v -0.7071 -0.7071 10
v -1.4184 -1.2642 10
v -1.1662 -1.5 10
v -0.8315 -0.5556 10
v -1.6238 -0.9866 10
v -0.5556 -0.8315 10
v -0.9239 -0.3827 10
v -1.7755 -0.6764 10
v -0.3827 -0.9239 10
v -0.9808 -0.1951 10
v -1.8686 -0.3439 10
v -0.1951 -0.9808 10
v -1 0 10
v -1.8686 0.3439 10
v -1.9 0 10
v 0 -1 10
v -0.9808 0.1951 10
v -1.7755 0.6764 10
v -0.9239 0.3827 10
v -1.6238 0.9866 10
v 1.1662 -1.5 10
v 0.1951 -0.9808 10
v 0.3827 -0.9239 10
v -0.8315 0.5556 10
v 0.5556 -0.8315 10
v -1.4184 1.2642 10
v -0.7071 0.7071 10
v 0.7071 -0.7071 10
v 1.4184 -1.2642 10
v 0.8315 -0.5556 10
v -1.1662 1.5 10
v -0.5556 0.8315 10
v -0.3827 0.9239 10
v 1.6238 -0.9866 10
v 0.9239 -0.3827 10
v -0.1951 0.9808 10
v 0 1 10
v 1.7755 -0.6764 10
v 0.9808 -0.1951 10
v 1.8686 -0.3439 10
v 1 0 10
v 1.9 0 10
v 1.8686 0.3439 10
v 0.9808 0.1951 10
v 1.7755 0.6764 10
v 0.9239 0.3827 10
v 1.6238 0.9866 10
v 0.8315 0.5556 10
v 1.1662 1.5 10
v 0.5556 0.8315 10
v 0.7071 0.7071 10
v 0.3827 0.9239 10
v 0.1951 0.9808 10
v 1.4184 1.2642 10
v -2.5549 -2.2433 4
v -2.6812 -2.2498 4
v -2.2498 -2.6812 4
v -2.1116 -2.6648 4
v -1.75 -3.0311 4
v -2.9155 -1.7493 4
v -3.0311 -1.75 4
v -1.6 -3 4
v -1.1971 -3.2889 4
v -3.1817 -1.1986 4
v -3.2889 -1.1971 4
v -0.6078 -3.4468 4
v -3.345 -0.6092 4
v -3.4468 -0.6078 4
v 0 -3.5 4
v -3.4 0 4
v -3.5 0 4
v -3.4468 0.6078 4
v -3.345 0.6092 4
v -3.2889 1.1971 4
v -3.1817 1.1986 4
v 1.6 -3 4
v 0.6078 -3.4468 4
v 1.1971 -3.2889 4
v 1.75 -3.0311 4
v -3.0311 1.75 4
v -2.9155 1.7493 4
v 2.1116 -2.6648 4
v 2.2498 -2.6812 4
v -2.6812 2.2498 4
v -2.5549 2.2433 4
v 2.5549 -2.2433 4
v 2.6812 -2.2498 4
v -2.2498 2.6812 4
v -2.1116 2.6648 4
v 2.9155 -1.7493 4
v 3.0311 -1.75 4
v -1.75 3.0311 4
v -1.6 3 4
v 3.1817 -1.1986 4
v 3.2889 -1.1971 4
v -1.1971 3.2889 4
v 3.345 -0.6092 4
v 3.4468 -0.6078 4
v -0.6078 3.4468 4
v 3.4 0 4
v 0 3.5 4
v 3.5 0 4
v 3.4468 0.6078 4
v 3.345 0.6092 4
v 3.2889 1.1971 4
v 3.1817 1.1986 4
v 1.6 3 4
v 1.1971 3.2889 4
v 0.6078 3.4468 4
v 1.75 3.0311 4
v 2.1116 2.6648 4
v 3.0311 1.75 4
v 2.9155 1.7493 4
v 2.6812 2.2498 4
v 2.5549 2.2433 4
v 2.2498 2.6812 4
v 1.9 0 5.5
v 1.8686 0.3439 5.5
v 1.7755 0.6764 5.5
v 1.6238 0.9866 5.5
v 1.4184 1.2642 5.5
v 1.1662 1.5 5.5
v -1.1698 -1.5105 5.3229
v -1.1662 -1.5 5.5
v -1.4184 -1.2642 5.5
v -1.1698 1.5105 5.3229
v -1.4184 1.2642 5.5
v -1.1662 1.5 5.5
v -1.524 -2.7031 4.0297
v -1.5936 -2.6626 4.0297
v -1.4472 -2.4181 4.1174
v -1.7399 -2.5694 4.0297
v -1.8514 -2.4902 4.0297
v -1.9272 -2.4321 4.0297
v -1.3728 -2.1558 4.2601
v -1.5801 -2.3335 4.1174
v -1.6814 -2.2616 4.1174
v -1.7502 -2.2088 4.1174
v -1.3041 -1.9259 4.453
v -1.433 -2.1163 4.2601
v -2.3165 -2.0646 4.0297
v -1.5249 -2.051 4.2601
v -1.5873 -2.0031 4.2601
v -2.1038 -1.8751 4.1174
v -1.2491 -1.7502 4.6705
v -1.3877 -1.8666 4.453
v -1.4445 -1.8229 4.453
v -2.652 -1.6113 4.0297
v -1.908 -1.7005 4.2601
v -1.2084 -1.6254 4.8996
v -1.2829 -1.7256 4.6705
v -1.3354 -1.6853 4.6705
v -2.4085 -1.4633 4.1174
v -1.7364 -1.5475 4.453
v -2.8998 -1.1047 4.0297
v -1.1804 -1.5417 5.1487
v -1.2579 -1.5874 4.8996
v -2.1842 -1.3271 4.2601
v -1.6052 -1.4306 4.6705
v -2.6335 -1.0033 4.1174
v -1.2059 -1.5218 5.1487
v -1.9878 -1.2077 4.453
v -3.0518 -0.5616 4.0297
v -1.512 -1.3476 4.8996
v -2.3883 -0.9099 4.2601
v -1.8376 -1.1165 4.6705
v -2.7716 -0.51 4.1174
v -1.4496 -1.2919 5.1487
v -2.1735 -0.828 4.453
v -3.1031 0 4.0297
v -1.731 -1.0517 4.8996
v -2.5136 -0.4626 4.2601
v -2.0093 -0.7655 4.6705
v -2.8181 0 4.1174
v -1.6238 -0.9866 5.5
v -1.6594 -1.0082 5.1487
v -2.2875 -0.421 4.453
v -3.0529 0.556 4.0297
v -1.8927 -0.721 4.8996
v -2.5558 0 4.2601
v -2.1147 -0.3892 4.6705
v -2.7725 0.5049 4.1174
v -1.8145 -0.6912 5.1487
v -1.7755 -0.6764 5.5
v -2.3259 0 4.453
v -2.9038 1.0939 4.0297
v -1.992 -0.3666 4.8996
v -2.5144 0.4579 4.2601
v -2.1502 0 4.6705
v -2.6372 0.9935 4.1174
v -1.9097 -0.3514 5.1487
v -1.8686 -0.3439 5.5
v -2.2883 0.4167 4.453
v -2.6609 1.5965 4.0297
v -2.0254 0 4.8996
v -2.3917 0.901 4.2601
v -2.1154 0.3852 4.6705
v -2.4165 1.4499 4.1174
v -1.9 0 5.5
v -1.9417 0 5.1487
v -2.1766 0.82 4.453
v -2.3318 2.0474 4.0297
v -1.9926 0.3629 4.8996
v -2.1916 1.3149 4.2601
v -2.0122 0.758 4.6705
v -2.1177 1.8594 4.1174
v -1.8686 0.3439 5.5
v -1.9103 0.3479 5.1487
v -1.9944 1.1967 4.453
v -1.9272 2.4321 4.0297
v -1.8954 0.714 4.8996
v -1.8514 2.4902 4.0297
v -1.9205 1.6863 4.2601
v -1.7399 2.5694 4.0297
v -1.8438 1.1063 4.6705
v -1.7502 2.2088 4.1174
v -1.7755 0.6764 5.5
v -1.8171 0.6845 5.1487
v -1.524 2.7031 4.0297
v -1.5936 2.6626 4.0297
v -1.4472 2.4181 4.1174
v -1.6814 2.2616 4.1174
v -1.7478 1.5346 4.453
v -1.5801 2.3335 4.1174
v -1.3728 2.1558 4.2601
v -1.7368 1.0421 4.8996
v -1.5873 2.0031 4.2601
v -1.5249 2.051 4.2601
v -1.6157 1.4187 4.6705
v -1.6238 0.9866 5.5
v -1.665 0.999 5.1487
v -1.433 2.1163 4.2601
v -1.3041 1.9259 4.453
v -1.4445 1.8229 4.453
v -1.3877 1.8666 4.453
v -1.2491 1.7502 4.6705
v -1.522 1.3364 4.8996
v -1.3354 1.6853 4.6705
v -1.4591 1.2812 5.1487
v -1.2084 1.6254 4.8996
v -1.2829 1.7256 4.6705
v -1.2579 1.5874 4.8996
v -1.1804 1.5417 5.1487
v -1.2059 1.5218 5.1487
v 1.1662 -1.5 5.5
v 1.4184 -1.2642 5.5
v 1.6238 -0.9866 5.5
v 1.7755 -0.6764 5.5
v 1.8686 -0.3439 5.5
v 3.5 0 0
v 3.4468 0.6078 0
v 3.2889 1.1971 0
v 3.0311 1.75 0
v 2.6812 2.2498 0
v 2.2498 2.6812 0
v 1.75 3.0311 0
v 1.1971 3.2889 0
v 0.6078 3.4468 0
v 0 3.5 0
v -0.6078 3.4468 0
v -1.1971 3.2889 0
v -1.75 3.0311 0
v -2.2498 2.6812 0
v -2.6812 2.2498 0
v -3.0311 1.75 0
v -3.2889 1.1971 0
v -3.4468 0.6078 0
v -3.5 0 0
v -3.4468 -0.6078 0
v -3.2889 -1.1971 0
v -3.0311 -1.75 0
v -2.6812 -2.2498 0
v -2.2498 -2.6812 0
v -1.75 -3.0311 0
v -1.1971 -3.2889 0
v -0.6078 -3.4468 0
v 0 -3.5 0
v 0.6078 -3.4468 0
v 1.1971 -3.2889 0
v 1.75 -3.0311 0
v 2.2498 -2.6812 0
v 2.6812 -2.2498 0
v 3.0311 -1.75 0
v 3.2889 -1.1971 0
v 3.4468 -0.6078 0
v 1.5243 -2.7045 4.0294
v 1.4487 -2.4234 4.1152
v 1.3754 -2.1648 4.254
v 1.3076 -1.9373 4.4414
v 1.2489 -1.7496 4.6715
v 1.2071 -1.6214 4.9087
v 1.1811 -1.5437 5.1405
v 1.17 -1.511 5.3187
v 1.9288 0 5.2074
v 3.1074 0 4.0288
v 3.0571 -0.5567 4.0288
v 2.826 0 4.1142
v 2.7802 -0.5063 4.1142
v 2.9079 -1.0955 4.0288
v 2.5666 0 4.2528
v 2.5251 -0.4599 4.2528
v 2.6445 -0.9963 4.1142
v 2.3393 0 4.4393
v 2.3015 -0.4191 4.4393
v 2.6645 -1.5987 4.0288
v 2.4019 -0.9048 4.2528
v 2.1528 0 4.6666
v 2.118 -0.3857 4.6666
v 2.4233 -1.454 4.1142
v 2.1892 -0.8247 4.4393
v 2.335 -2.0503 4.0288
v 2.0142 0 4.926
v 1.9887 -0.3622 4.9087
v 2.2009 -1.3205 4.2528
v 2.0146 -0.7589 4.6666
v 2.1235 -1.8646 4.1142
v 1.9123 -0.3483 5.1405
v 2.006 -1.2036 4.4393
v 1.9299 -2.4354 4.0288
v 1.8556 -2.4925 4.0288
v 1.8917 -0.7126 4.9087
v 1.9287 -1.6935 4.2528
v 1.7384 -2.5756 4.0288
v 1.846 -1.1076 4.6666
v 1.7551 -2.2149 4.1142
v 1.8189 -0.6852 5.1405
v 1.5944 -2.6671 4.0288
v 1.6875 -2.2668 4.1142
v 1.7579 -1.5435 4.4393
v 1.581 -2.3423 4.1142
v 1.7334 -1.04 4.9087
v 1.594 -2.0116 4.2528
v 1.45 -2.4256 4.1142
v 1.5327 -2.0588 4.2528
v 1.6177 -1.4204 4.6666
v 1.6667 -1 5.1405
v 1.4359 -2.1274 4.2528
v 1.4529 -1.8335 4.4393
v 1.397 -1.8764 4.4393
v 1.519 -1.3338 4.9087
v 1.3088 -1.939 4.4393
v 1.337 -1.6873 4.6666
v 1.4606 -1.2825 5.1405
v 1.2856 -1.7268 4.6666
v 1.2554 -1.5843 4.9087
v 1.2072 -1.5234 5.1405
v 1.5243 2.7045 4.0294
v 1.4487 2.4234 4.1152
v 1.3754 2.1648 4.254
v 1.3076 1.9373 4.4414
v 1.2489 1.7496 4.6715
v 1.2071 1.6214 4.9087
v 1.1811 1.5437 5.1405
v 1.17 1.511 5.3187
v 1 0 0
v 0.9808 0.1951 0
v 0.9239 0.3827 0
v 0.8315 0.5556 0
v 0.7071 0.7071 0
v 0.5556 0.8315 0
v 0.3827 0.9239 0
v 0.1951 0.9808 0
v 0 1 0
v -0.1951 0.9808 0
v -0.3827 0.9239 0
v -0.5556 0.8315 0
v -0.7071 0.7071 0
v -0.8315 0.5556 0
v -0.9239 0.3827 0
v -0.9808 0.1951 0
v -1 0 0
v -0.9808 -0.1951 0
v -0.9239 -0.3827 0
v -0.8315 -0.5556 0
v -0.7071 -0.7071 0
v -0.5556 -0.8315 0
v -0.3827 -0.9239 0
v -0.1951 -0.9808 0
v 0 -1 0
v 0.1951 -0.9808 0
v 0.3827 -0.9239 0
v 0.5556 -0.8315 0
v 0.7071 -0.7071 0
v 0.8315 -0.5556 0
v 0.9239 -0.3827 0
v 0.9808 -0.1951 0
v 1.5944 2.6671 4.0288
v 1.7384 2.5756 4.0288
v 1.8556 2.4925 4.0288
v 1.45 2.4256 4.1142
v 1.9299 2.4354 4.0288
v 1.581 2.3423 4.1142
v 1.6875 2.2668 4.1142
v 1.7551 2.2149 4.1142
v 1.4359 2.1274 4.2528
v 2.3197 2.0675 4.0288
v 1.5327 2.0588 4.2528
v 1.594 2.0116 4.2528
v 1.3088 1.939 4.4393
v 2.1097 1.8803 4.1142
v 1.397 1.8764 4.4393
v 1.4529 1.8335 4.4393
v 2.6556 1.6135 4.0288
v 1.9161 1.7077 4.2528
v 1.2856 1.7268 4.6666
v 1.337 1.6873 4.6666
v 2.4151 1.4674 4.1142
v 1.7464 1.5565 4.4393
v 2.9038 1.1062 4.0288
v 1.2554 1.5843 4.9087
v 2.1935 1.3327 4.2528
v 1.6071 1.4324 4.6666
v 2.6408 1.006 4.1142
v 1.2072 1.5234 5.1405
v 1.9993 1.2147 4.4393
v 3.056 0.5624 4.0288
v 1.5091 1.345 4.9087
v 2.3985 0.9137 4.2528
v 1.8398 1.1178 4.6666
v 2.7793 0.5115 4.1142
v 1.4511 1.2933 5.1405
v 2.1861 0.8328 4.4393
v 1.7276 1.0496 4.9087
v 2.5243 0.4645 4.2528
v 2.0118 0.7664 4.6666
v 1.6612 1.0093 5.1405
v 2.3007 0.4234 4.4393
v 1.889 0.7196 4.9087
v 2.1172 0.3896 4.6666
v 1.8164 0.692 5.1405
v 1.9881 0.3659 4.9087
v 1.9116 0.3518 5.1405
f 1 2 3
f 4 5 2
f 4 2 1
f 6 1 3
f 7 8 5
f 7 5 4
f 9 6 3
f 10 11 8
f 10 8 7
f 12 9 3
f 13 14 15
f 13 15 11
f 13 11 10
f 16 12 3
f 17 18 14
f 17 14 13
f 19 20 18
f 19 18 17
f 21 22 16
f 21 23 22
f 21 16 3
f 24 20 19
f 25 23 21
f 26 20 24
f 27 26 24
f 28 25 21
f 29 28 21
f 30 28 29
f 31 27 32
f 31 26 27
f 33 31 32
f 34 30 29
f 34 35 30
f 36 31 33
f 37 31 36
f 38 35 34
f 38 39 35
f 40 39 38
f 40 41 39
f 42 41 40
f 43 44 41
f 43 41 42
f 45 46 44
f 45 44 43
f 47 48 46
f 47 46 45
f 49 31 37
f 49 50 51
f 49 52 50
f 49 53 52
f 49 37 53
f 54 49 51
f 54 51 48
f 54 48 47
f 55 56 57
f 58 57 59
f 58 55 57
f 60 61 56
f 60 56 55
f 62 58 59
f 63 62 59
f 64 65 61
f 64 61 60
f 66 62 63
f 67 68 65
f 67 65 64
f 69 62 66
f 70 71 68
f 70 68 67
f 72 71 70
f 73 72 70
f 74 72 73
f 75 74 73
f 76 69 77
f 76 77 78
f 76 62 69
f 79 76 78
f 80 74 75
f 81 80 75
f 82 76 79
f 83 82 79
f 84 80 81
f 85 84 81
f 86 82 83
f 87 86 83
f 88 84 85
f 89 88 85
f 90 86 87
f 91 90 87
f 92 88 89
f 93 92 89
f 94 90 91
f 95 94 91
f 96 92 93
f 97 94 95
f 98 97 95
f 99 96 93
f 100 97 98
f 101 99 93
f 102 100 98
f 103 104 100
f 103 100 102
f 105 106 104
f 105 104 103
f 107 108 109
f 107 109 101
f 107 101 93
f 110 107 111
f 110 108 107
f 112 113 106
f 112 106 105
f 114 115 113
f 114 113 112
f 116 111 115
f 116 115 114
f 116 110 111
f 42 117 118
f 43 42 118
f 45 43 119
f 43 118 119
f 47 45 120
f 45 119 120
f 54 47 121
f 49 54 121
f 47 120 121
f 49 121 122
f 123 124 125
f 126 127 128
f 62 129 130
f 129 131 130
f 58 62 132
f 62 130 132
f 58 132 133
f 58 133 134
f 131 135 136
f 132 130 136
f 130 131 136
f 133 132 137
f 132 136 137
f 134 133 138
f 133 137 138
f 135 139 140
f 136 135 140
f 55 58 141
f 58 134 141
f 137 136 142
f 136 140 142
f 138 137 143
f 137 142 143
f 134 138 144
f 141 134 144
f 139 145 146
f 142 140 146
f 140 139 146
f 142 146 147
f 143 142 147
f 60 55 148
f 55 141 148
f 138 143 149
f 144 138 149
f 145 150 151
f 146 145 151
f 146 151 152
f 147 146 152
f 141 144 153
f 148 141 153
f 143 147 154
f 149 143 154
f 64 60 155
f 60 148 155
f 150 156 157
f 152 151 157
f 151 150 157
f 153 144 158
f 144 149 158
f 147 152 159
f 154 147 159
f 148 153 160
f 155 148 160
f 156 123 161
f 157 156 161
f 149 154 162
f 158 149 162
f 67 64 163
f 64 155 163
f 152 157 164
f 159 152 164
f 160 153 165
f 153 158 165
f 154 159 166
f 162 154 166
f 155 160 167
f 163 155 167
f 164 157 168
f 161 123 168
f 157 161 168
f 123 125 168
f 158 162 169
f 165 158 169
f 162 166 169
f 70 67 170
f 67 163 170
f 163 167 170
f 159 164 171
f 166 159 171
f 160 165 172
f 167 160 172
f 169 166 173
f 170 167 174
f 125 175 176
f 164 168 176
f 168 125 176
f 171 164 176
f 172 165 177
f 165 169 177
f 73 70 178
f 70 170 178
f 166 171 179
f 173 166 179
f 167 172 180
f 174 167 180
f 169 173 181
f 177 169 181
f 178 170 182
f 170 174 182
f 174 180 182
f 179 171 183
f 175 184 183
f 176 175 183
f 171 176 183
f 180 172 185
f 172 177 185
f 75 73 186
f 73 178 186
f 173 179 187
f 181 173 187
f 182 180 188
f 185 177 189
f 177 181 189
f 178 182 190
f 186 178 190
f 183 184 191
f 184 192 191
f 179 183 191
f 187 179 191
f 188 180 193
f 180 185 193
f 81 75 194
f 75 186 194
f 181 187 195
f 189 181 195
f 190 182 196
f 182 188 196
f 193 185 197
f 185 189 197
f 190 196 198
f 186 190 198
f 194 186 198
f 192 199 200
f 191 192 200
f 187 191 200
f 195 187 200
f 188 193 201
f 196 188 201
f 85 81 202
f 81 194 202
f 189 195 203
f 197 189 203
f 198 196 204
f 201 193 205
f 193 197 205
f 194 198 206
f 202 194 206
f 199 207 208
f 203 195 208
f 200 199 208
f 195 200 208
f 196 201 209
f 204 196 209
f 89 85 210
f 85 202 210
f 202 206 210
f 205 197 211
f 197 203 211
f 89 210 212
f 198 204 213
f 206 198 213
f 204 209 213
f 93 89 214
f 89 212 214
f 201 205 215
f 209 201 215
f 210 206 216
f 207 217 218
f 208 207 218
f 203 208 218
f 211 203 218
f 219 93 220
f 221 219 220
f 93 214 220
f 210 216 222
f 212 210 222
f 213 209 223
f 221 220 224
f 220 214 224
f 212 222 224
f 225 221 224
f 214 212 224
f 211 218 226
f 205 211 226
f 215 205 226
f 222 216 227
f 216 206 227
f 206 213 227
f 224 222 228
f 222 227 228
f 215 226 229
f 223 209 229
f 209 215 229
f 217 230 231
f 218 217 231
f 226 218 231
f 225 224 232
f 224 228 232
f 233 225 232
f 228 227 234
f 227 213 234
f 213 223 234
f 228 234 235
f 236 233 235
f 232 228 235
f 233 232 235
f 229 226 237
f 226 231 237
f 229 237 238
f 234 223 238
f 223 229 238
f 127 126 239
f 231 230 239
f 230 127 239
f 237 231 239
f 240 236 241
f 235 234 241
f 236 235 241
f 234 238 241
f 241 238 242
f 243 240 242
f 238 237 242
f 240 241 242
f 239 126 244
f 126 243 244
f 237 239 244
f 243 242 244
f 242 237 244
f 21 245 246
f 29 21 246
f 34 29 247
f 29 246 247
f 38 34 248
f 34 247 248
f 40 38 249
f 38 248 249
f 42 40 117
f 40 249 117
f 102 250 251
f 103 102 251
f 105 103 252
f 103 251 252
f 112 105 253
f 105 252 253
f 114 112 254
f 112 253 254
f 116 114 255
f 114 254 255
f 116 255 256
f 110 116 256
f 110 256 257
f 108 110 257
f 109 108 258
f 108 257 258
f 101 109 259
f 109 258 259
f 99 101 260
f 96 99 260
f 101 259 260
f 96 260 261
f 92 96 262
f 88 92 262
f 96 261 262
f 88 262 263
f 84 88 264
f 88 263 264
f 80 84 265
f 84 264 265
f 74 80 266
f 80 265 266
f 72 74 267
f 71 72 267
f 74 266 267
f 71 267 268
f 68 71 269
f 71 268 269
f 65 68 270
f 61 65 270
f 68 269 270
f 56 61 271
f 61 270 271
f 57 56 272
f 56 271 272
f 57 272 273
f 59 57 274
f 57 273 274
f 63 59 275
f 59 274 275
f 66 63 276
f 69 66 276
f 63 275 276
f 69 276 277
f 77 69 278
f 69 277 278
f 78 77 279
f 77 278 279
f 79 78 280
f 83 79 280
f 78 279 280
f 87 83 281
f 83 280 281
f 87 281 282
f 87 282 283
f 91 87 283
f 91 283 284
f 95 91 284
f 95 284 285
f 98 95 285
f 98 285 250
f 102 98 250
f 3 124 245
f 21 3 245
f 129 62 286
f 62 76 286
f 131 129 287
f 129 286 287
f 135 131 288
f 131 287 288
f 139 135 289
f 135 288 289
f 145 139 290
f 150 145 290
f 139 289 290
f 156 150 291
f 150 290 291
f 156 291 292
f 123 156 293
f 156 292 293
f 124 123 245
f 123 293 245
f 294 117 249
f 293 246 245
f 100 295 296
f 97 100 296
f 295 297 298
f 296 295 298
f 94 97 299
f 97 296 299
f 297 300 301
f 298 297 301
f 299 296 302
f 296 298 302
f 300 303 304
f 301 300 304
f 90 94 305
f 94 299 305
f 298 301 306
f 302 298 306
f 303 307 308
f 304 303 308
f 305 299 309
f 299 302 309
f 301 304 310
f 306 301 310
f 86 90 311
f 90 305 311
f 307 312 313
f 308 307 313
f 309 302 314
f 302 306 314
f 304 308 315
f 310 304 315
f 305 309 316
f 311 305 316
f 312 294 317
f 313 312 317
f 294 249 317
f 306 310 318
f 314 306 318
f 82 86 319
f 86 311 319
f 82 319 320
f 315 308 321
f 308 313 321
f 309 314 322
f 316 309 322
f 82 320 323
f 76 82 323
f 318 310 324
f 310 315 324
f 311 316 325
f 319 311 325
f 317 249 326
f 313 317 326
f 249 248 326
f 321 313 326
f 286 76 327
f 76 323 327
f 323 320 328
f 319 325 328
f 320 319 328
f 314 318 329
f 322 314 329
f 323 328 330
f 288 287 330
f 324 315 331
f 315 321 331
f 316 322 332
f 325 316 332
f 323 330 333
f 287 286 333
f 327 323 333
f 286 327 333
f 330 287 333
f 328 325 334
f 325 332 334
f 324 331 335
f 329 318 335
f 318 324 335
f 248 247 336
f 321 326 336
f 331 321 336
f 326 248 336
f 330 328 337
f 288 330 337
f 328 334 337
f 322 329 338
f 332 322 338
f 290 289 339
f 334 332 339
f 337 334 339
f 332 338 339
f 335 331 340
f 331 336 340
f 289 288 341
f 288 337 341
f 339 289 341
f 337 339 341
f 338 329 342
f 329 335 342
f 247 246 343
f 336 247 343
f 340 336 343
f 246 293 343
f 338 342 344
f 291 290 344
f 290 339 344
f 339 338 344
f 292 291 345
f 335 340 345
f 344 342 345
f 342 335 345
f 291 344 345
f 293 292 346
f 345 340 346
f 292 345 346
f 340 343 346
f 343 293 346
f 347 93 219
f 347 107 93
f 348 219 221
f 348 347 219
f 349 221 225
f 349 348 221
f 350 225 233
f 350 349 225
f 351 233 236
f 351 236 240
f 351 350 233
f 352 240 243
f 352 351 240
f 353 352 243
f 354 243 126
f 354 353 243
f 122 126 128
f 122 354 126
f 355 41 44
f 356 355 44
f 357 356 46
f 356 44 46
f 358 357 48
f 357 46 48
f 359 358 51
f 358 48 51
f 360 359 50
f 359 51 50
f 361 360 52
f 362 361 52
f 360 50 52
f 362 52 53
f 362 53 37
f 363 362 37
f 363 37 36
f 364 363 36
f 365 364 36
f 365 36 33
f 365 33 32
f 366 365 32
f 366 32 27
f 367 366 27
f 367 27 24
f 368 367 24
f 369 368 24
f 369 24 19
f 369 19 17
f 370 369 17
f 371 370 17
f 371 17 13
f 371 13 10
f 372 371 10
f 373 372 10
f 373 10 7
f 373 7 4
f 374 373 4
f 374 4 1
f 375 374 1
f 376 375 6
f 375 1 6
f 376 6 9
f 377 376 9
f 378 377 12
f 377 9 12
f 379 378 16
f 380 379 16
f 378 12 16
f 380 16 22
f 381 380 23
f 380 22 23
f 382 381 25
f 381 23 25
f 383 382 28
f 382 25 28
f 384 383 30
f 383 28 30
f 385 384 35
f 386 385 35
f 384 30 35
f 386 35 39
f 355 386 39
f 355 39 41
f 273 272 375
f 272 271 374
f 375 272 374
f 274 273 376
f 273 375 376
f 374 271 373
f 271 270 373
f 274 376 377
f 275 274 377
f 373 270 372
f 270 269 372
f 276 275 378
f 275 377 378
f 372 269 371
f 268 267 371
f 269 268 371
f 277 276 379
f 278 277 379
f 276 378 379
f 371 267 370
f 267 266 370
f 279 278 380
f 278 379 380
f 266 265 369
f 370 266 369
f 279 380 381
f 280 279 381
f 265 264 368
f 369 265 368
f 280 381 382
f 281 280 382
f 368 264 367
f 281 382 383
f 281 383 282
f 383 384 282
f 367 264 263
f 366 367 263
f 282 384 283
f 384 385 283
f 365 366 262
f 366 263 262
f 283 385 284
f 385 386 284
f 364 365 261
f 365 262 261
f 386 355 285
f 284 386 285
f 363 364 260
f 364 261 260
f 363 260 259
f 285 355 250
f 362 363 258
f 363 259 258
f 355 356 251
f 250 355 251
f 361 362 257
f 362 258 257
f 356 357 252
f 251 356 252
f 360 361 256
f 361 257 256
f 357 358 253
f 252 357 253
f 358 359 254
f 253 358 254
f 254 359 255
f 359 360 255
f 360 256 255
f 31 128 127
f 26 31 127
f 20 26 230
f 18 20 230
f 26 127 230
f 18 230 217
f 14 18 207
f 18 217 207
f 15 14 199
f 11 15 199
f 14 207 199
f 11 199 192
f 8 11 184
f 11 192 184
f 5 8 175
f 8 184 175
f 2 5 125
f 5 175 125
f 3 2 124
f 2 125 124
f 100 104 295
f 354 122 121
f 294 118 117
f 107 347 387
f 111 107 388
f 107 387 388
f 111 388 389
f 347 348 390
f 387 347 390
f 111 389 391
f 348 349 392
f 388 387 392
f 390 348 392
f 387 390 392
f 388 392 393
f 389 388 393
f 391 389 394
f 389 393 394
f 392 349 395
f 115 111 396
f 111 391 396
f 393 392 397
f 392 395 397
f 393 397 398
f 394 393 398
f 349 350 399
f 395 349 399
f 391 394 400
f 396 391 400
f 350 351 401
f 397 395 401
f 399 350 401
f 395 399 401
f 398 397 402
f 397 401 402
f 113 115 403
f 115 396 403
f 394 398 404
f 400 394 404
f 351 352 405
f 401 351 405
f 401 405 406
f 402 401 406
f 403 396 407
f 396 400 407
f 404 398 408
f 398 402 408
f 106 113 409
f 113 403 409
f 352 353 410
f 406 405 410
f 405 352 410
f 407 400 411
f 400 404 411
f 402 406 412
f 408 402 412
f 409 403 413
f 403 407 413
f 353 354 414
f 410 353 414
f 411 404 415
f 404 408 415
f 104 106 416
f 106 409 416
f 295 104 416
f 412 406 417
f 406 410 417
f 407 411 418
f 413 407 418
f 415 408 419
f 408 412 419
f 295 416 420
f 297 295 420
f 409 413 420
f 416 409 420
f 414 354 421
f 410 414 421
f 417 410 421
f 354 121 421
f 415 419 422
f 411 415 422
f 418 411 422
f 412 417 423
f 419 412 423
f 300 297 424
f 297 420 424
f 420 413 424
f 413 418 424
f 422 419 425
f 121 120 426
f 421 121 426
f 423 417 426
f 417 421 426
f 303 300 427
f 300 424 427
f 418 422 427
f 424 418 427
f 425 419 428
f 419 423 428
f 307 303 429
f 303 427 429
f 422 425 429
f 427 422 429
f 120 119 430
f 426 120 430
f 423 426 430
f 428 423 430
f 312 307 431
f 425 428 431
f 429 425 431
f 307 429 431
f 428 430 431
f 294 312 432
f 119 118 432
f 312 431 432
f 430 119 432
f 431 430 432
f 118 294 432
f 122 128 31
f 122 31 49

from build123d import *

# Parameters (mm, degrees)
F0_W     = 2.3323807579
F0_H     = 3
F1_DEPTH = 10
F2_R     = 3.5
F3_DEPTH = 4
F4_R     = 1.5
F5_R     = 1
F6_DEPTH = 25


with BuildPart() as f1:
    # F0 (on Top) → F1 (new body)
    with BuildSketch(Plane.XY):
        with BuildLine():
            Line((-1.166190379, -1.5), (-1.166190379, 1.5))
            ThreePointArc((-1.166190379, 1.5), (-1.9, 0), (-1.166190379, -1.5))
        make_face()
        with BuildLine():
            ThreePointArc((1.166190379, -1.5), (1.7067163971, -0.8349366084), (1.9, 0))
            ThreePointArc((1.9, 0), (1.7067163971, 0.8349366084), (1.166190379, 1.5))
            Line((1.166190379, 1.5), (1.166190379, -1.5))
        make_face()
        Rectangle(F0_W, F0_H)
    extrude(amount=F1_DEPTH)

    # F2 (on Top) → F3 (join)
    with BuildSketch(Plane.XY):
        Circle(F2_R)
    extrude(amount=F3_DEPTH)

    # F4
    f4_edges = [f1.edges().sort_by_distance(p)[0] for p in [
        (-1.9, 0, 4),
        (0, 1.5, 4),
        (0, -1.5, 4),
        (1.9, 0, 4),
    ]]
    fillet(f4_edges, radius=F4_R)

    # F5 (on face) → F6 (cut)
    with BuildSketch(Plane.XY.offset(10)):
        Circle(F5_R)
    extrude(amount=-F6_DEPTH, mode=Mode.SUBTRACT)


solid = f1.part
